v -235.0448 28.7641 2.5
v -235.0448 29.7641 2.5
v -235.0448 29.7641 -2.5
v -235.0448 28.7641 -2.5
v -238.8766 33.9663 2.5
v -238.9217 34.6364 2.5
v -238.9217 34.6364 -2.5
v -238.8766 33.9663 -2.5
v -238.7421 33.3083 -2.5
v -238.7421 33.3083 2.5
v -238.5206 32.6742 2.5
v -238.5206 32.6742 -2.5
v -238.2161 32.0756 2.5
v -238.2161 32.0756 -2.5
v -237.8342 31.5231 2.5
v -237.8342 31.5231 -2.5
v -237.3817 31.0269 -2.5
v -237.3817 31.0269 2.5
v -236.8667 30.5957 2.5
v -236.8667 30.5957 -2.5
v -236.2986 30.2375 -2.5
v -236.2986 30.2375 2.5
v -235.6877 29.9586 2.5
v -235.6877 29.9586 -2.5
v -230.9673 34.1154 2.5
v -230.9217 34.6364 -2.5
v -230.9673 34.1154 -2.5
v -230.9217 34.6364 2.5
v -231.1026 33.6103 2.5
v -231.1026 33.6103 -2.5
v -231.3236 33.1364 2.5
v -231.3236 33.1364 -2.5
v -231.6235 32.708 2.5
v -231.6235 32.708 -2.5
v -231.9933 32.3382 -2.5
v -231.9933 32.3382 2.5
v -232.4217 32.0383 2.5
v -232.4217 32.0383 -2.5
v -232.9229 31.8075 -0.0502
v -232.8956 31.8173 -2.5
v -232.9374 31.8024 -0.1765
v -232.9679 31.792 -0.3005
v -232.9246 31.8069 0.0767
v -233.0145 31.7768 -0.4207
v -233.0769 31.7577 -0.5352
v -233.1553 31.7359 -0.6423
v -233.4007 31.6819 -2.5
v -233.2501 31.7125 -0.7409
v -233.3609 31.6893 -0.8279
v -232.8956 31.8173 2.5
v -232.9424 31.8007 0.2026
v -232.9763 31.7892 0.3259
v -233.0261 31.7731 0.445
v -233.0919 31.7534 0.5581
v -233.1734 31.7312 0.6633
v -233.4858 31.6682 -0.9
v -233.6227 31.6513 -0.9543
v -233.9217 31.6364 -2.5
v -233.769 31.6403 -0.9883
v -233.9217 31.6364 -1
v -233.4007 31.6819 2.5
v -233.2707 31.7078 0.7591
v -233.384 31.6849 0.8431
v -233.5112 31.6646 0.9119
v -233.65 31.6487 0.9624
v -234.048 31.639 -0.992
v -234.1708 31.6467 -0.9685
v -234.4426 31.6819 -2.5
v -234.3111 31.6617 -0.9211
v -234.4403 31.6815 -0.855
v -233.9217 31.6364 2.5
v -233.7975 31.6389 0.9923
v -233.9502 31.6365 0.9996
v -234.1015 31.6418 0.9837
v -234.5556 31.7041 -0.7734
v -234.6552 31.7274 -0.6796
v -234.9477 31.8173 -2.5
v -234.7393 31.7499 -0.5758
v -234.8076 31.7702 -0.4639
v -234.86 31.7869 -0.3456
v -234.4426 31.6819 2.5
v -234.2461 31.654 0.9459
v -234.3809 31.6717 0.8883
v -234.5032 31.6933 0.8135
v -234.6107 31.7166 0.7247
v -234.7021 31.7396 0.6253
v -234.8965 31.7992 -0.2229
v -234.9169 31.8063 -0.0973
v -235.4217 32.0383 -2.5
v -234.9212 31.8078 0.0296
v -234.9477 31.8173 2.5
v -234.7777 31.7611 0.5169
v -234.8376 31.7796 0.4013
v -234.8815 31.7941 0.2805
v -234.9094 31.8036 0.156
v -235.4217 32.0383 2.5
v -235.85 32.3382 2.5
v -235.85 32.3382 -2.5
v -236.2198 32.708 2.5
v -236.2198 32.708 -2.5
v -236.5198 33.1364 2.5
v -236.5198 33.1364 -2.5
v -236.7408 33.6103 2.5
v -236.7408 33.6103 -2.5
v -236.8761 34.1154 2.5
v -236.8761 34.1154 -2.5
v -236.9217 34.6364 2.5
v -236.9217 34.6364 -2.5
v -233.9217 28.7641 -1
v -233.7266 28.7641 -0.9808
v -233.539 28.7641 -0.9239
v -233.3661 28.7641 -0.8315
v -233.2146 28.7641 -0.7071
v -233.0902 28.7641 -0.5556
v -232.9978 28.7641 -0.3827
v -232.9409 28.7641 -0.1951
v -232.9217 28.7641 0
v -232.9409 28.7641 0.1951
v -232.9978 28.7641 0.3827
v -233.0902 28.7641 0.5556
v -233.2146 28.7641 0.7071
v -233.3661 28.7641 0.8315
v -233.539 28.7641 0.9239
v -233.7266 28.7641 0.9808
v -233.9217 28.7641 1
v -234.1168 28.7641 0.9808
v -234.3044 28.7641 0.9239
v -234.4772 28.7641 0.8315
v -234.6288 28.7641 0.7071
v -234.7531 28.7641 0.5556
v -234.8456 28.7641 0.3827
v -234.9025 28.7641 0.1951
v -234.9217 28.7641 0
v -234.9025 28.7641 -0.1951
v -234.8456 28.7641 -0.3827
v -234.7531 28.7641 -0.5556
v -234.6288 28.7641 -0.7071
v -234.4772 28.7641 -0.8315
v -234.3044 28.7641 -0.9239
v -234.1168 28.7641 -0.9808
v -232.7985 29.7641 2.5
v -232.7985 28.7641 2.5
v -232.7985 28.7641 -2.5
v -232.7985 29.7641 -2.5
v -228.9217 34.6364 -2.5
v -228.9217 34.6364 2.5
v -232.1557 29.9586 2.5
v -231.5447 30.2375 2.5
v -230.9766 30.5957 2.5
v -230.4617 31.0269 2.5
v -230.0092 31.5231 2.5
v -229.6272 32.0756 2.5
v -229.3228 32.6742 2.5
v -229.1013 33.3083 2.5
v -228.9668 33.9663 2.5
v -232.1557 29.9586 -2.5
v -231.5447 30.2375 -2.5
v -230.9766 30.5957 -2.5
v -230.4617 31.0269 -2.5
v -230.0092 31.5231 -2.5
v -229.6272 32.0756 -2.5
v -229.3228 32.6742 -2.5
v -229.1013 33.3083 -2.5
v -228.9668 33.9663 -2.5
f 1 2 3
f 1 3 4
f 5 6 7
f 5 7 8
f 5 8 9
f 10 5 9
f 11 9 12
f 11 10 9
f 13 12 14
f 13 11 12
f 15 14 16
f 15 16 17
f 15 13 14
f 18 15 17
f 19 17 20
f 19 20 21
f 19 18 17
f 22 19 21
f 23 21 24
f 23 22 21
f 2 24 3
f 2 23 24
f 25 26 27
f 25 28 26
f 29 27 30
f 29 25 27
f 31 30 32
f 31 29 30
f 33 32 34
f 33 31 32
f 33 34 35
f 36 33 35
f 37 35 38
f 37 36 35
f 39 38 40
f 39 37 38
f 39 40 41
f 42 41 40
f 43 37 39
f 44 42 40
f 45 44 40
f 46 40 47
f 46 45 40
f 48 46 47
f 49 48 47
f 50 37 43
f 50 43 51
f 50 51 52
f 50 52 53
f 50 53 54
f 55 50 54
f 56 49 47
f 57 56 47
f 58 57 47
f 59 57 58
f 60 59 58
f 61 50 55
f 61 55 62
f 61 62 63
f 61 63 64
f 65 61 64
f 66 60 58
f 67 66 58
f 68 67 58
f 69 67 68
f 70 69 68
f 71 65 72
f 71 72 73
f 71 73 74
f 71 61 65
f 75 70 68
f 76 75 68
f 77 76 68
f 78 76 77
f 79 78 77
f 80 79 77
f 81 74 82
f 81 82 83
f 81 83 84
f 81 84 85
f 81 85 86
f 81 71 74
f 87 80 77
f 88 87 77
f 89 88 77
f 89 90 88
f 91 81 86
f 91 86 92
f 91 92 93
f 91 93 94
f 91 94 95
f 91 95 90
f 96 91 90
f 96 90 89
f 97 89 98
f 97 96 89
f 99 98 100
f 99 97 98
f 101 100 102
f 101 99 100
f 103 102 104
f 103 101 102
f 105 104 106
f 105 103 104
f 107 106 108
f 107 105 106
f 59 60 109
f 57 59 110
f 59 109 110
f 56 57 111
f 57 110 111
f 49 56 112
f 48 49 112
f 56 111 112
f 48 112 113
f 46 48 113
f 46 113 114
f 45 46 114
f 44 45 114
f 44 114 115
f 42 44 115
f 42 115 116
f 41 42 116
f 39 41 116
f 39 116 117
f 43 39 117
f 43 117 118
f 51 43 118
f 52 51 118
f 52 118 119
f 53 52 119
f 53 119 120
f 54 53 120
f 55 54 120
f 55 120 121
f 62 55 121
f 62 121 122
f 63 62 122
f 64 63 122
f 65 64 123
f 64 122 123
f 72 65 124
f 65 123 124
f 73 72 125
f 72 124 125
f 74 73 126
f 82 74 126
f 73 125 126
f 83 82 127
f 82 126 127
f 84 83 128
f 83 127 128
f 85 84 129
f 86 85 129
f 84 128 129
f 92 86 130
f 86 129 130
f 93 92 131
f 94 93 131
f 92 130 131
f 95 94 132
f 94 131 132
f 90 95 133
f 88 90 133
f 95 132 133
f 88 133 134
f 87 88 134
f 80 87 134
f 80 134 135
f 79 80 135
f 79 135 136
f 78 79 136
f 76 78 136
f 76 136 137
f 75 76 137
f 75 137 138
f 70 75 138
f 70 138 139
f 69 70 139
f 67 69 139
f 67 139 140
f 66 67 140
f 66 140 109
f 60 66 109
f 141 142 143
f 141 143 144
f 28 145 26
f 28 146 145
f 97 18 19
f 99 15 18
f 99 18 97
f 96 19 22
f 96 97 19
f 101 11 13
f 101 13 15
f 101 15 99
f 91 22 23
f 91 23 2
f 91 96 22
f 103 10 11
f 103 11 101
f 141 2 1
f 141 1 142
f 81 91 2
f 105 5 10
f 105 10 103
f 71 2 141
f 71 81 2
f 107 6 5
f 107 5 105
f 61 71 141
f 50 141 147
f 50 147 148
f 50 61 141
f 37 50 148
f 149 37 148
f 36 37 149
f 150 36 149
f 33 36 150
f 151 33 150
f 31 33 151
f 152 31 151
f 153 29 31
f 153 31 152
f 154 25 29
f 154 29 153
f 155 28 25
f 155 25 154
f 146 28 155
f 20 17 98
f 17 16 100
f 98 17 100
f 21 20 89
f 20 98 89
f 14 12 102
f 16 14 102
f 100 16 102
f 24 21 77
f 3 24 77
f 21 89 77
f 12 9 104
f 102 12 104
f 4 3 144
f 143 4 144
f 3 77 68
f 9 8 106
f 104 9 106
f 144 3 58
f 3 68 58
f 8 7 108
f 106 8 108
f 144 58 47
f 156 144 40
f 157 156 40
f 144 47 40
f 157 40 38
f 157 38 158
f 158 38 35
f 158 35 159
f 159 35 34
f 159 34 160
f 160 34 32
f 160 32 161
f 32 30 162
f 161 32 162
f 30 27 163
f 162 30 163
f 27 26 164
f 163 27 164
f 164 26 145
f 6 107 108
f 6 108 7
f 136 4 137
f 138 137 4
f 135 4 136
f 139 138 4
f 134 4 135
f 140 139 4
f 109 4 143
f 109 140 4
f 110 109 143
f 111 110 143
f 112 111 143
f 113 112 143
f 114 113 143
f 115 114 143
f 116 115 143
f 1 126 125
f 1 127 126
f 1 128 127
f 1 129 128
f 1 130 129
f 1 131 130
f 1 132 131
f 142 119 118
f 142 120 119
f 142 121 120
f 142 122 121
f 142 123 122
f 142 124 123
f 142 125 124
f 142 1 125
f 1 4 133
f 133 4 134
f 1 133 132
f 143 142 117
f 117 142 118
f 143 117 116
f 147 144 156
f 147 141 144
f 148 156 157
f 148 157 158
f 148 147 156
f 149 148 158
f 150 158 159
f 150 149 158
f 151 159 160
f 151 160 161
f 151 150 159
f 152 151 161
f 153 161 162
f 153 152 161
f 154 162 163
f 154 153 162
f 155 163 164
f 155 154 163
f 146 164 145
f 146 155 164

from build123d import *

# Parameters (mm, degrees)
BOSS_EXTRUDE1_DEPTH = 2.5
SKETCH3_R           = 1
CUT_EXTRUDE1_DEPTH  = 5


with BuildPart() as part:
    # Sketch1 → Boss-Extrude1 (new, symmetric)
    with BuildSketch(Plane.XY):
        with BuildLine():
            ThreePointArc((-230.921678322, 34.636363636), (-231.800357978, 32.515043293), (-233.921678322, 31.636363636))
            Line((-233.921678322, 31.636363636), (-233.921678322, 29.636363636))
            ThreePointArc((-233.921678322, 29.636363636), (-233.356489225, 29.668410206), (-232.798545076, 29.764139123))
            ThreePointArc((-232.798545076, 29.764139123), (-230.009155719, 31.52313912), (-228.921678322, 34.636363636))
            Line((-228.921678322, 34.636363636), (-230.921678322, 34.636363636))
        make_face()
        with BuildLine():
            ThreePointArc((-233.921678322, 31.636363636), (-236.042998665, 32.515043293), (-236.921678322, 34.636363636))
            Line((-236.921678322, 34.636363636), (-238.921678322, 34.636363636))
            ThreePointArc((-238.921678322, 34.636363636), (-237.834200924, 31.52313912), (-235.044811567, 29.764139123))
            ThreePointArc((-235.044811567, 29.764139123), (-234.486867419, 29.668410206), (-233.921678322, 29.636363636))
            Line((-233.921678322, 29.636363636), (-233.921678322, 31.636363636))
        make_face()
        with BuildLine():
            ThreePointArc((-232.798545076, 29.764139123), (-233.356489225, 29.668410206), (-233.921678322, 29.636363636))
            Line((-233.921678322, 29.636363636), (-233.921678322, 28.764139123))
            Line((-233.921678322, 28.764139123), (-232.798545076, 28.764139123))
            Line((-232.798545076, 28.764139123), (-232.798545076, 29.764139123))
        make_face()
        with BuildLine():
            ThreePointArc((-233.921678322, 29.636363636), (-234.486867419, 29.668410206), (-235.044811567, 29.764139123))
            Line((-235.044811567, 29.764139123), (-235.044811567, 28.764139123))
            Line((-235.044811567, 28.764139123), (-233.921678322, 28.764139123))
            Line((-233.921678322, 28.764139123), (-233.921678322, 29.636363636))
        make_face()
    extrude(amount=BOSS_EXTRUDE1_DEPTH, both=True)

    # Sketch3 → Cut-Extrude1 (cut)
    with BuildSketch(Plane.XZ.offset(-28.764139123)):
        with Locations(Location((-233.921678322, 0, 0), (0, 0, 270))):
            Circle(SKETCH3_R)
    extrude(amount=-CUT_EXTRUDE1_DEPTH, mode=Mode.SUBTRACT)


solid = part.part
